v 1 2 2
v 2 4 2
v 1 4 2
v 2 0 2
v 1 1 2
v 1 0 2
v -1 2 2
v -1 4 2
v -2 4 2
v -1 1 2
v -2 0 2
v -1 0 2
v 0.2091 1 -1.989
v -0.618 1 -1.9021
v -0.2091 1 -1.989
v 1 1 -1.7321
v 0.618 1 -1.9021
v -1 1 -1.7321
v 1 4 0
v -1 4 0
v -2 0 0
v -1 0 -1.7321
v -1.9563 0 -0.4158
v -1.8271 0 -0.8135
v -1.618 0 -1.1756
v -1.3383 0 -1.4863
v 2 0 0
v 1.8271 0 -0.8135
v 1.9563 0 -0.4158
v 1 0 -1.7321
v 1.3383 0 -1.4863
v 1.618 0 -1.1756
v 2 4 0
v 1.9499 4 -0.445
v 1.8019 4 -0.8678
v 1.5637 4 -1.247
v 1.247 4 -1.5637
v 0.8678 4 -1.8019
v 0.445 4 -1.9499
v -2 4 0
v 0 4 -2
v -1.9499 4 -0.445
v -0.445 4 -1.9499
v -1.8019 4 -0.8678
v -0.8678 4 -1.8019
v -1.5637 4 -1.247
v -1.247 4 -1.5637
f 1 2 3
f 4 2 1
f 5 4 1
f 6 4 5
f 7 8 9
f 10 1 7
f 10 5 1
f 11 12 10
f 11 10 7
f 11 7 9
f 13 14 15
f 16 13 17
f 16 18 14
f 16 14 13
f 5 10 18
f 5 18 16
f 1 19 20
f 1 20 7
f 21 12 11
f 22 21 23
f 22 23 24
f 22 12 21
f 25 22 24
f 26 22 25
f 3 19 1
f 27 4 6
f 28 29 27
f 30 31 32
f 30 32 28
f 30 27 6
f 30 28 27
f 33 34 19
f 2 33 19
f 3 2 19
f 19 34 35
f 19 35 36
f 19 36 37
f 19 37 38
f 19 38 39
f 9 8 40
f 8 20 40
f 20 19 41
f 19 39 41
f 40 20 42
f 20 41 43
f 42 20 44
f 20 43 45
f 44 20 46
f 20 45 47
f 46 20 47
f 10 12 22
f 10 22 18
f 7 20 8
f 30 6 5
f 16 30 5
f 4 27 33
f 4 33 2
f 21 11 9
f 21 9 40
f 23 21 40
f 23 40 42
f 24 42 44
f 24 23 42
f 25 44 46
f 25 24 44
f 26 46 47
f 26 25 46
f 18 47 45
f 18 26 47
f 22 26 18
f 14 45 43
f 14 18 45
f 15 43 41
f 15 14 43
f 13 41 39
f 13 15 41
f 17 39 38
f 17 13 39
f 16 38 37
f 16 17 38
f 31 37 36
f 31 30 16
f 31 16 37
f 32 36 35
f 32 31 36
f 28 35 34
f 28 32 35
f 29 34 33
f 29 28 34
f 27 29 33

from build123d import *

# Parameters (mm, degrees)
BOSS_EXTRUDE1_DEPTH = 4
SKETCH2_W           = 2
SKETCH2_H           = 1
CUT_EXTRUDE1_DEPTH  = 4
CUT_EXTRUDE2_DEPTH  = 1


with BuildPart() as part:
    # Sketch1 → Boss-Extrude1 (new body)
    with BuildSketch(Plane(origin=(0, 0, 0), x_dir=(1, 0, 0), z_dir=(0, 1, 0))):
        with BuildLine():
            Line((-2, -2), (-2, 0))
            ThreePointArc((-2, 0), (0, 2), (2, 0))
            Line((2, 0), (2, -2))
            Line((2, -2), (-2, -2))
        make_face()
    extrude(amount=BOSS_EXTRUDE1_DEPTH)

    # Sketch2 → Cut-Extrude1 (cut)
    with BuildSketch(Plane.XY.offset(2)):
        with Locations((0, 0.5)):
            Rectangle(SKETCH2_W, SKETCH2_H)
    extrude(amount=-CUT_EXTRUDE1_DEPTH, mode=Mode.SUBTRACT)

    # Sketch3 → Cut-Extrude2 (cut, symmetric)
    with BuildSketch(Plane(origin=(0, 0, 0), x_dir=(0, 0, -1), z_dir=(1, 0, 0))):
        Polygon((0, 4), (-2, 2), (-2, 4), align=None)
    extrude(amount=CUT_EXTRUDE2_DEPTH, both=True, mode=Mode.SUBTRACT)


solid = part.part
